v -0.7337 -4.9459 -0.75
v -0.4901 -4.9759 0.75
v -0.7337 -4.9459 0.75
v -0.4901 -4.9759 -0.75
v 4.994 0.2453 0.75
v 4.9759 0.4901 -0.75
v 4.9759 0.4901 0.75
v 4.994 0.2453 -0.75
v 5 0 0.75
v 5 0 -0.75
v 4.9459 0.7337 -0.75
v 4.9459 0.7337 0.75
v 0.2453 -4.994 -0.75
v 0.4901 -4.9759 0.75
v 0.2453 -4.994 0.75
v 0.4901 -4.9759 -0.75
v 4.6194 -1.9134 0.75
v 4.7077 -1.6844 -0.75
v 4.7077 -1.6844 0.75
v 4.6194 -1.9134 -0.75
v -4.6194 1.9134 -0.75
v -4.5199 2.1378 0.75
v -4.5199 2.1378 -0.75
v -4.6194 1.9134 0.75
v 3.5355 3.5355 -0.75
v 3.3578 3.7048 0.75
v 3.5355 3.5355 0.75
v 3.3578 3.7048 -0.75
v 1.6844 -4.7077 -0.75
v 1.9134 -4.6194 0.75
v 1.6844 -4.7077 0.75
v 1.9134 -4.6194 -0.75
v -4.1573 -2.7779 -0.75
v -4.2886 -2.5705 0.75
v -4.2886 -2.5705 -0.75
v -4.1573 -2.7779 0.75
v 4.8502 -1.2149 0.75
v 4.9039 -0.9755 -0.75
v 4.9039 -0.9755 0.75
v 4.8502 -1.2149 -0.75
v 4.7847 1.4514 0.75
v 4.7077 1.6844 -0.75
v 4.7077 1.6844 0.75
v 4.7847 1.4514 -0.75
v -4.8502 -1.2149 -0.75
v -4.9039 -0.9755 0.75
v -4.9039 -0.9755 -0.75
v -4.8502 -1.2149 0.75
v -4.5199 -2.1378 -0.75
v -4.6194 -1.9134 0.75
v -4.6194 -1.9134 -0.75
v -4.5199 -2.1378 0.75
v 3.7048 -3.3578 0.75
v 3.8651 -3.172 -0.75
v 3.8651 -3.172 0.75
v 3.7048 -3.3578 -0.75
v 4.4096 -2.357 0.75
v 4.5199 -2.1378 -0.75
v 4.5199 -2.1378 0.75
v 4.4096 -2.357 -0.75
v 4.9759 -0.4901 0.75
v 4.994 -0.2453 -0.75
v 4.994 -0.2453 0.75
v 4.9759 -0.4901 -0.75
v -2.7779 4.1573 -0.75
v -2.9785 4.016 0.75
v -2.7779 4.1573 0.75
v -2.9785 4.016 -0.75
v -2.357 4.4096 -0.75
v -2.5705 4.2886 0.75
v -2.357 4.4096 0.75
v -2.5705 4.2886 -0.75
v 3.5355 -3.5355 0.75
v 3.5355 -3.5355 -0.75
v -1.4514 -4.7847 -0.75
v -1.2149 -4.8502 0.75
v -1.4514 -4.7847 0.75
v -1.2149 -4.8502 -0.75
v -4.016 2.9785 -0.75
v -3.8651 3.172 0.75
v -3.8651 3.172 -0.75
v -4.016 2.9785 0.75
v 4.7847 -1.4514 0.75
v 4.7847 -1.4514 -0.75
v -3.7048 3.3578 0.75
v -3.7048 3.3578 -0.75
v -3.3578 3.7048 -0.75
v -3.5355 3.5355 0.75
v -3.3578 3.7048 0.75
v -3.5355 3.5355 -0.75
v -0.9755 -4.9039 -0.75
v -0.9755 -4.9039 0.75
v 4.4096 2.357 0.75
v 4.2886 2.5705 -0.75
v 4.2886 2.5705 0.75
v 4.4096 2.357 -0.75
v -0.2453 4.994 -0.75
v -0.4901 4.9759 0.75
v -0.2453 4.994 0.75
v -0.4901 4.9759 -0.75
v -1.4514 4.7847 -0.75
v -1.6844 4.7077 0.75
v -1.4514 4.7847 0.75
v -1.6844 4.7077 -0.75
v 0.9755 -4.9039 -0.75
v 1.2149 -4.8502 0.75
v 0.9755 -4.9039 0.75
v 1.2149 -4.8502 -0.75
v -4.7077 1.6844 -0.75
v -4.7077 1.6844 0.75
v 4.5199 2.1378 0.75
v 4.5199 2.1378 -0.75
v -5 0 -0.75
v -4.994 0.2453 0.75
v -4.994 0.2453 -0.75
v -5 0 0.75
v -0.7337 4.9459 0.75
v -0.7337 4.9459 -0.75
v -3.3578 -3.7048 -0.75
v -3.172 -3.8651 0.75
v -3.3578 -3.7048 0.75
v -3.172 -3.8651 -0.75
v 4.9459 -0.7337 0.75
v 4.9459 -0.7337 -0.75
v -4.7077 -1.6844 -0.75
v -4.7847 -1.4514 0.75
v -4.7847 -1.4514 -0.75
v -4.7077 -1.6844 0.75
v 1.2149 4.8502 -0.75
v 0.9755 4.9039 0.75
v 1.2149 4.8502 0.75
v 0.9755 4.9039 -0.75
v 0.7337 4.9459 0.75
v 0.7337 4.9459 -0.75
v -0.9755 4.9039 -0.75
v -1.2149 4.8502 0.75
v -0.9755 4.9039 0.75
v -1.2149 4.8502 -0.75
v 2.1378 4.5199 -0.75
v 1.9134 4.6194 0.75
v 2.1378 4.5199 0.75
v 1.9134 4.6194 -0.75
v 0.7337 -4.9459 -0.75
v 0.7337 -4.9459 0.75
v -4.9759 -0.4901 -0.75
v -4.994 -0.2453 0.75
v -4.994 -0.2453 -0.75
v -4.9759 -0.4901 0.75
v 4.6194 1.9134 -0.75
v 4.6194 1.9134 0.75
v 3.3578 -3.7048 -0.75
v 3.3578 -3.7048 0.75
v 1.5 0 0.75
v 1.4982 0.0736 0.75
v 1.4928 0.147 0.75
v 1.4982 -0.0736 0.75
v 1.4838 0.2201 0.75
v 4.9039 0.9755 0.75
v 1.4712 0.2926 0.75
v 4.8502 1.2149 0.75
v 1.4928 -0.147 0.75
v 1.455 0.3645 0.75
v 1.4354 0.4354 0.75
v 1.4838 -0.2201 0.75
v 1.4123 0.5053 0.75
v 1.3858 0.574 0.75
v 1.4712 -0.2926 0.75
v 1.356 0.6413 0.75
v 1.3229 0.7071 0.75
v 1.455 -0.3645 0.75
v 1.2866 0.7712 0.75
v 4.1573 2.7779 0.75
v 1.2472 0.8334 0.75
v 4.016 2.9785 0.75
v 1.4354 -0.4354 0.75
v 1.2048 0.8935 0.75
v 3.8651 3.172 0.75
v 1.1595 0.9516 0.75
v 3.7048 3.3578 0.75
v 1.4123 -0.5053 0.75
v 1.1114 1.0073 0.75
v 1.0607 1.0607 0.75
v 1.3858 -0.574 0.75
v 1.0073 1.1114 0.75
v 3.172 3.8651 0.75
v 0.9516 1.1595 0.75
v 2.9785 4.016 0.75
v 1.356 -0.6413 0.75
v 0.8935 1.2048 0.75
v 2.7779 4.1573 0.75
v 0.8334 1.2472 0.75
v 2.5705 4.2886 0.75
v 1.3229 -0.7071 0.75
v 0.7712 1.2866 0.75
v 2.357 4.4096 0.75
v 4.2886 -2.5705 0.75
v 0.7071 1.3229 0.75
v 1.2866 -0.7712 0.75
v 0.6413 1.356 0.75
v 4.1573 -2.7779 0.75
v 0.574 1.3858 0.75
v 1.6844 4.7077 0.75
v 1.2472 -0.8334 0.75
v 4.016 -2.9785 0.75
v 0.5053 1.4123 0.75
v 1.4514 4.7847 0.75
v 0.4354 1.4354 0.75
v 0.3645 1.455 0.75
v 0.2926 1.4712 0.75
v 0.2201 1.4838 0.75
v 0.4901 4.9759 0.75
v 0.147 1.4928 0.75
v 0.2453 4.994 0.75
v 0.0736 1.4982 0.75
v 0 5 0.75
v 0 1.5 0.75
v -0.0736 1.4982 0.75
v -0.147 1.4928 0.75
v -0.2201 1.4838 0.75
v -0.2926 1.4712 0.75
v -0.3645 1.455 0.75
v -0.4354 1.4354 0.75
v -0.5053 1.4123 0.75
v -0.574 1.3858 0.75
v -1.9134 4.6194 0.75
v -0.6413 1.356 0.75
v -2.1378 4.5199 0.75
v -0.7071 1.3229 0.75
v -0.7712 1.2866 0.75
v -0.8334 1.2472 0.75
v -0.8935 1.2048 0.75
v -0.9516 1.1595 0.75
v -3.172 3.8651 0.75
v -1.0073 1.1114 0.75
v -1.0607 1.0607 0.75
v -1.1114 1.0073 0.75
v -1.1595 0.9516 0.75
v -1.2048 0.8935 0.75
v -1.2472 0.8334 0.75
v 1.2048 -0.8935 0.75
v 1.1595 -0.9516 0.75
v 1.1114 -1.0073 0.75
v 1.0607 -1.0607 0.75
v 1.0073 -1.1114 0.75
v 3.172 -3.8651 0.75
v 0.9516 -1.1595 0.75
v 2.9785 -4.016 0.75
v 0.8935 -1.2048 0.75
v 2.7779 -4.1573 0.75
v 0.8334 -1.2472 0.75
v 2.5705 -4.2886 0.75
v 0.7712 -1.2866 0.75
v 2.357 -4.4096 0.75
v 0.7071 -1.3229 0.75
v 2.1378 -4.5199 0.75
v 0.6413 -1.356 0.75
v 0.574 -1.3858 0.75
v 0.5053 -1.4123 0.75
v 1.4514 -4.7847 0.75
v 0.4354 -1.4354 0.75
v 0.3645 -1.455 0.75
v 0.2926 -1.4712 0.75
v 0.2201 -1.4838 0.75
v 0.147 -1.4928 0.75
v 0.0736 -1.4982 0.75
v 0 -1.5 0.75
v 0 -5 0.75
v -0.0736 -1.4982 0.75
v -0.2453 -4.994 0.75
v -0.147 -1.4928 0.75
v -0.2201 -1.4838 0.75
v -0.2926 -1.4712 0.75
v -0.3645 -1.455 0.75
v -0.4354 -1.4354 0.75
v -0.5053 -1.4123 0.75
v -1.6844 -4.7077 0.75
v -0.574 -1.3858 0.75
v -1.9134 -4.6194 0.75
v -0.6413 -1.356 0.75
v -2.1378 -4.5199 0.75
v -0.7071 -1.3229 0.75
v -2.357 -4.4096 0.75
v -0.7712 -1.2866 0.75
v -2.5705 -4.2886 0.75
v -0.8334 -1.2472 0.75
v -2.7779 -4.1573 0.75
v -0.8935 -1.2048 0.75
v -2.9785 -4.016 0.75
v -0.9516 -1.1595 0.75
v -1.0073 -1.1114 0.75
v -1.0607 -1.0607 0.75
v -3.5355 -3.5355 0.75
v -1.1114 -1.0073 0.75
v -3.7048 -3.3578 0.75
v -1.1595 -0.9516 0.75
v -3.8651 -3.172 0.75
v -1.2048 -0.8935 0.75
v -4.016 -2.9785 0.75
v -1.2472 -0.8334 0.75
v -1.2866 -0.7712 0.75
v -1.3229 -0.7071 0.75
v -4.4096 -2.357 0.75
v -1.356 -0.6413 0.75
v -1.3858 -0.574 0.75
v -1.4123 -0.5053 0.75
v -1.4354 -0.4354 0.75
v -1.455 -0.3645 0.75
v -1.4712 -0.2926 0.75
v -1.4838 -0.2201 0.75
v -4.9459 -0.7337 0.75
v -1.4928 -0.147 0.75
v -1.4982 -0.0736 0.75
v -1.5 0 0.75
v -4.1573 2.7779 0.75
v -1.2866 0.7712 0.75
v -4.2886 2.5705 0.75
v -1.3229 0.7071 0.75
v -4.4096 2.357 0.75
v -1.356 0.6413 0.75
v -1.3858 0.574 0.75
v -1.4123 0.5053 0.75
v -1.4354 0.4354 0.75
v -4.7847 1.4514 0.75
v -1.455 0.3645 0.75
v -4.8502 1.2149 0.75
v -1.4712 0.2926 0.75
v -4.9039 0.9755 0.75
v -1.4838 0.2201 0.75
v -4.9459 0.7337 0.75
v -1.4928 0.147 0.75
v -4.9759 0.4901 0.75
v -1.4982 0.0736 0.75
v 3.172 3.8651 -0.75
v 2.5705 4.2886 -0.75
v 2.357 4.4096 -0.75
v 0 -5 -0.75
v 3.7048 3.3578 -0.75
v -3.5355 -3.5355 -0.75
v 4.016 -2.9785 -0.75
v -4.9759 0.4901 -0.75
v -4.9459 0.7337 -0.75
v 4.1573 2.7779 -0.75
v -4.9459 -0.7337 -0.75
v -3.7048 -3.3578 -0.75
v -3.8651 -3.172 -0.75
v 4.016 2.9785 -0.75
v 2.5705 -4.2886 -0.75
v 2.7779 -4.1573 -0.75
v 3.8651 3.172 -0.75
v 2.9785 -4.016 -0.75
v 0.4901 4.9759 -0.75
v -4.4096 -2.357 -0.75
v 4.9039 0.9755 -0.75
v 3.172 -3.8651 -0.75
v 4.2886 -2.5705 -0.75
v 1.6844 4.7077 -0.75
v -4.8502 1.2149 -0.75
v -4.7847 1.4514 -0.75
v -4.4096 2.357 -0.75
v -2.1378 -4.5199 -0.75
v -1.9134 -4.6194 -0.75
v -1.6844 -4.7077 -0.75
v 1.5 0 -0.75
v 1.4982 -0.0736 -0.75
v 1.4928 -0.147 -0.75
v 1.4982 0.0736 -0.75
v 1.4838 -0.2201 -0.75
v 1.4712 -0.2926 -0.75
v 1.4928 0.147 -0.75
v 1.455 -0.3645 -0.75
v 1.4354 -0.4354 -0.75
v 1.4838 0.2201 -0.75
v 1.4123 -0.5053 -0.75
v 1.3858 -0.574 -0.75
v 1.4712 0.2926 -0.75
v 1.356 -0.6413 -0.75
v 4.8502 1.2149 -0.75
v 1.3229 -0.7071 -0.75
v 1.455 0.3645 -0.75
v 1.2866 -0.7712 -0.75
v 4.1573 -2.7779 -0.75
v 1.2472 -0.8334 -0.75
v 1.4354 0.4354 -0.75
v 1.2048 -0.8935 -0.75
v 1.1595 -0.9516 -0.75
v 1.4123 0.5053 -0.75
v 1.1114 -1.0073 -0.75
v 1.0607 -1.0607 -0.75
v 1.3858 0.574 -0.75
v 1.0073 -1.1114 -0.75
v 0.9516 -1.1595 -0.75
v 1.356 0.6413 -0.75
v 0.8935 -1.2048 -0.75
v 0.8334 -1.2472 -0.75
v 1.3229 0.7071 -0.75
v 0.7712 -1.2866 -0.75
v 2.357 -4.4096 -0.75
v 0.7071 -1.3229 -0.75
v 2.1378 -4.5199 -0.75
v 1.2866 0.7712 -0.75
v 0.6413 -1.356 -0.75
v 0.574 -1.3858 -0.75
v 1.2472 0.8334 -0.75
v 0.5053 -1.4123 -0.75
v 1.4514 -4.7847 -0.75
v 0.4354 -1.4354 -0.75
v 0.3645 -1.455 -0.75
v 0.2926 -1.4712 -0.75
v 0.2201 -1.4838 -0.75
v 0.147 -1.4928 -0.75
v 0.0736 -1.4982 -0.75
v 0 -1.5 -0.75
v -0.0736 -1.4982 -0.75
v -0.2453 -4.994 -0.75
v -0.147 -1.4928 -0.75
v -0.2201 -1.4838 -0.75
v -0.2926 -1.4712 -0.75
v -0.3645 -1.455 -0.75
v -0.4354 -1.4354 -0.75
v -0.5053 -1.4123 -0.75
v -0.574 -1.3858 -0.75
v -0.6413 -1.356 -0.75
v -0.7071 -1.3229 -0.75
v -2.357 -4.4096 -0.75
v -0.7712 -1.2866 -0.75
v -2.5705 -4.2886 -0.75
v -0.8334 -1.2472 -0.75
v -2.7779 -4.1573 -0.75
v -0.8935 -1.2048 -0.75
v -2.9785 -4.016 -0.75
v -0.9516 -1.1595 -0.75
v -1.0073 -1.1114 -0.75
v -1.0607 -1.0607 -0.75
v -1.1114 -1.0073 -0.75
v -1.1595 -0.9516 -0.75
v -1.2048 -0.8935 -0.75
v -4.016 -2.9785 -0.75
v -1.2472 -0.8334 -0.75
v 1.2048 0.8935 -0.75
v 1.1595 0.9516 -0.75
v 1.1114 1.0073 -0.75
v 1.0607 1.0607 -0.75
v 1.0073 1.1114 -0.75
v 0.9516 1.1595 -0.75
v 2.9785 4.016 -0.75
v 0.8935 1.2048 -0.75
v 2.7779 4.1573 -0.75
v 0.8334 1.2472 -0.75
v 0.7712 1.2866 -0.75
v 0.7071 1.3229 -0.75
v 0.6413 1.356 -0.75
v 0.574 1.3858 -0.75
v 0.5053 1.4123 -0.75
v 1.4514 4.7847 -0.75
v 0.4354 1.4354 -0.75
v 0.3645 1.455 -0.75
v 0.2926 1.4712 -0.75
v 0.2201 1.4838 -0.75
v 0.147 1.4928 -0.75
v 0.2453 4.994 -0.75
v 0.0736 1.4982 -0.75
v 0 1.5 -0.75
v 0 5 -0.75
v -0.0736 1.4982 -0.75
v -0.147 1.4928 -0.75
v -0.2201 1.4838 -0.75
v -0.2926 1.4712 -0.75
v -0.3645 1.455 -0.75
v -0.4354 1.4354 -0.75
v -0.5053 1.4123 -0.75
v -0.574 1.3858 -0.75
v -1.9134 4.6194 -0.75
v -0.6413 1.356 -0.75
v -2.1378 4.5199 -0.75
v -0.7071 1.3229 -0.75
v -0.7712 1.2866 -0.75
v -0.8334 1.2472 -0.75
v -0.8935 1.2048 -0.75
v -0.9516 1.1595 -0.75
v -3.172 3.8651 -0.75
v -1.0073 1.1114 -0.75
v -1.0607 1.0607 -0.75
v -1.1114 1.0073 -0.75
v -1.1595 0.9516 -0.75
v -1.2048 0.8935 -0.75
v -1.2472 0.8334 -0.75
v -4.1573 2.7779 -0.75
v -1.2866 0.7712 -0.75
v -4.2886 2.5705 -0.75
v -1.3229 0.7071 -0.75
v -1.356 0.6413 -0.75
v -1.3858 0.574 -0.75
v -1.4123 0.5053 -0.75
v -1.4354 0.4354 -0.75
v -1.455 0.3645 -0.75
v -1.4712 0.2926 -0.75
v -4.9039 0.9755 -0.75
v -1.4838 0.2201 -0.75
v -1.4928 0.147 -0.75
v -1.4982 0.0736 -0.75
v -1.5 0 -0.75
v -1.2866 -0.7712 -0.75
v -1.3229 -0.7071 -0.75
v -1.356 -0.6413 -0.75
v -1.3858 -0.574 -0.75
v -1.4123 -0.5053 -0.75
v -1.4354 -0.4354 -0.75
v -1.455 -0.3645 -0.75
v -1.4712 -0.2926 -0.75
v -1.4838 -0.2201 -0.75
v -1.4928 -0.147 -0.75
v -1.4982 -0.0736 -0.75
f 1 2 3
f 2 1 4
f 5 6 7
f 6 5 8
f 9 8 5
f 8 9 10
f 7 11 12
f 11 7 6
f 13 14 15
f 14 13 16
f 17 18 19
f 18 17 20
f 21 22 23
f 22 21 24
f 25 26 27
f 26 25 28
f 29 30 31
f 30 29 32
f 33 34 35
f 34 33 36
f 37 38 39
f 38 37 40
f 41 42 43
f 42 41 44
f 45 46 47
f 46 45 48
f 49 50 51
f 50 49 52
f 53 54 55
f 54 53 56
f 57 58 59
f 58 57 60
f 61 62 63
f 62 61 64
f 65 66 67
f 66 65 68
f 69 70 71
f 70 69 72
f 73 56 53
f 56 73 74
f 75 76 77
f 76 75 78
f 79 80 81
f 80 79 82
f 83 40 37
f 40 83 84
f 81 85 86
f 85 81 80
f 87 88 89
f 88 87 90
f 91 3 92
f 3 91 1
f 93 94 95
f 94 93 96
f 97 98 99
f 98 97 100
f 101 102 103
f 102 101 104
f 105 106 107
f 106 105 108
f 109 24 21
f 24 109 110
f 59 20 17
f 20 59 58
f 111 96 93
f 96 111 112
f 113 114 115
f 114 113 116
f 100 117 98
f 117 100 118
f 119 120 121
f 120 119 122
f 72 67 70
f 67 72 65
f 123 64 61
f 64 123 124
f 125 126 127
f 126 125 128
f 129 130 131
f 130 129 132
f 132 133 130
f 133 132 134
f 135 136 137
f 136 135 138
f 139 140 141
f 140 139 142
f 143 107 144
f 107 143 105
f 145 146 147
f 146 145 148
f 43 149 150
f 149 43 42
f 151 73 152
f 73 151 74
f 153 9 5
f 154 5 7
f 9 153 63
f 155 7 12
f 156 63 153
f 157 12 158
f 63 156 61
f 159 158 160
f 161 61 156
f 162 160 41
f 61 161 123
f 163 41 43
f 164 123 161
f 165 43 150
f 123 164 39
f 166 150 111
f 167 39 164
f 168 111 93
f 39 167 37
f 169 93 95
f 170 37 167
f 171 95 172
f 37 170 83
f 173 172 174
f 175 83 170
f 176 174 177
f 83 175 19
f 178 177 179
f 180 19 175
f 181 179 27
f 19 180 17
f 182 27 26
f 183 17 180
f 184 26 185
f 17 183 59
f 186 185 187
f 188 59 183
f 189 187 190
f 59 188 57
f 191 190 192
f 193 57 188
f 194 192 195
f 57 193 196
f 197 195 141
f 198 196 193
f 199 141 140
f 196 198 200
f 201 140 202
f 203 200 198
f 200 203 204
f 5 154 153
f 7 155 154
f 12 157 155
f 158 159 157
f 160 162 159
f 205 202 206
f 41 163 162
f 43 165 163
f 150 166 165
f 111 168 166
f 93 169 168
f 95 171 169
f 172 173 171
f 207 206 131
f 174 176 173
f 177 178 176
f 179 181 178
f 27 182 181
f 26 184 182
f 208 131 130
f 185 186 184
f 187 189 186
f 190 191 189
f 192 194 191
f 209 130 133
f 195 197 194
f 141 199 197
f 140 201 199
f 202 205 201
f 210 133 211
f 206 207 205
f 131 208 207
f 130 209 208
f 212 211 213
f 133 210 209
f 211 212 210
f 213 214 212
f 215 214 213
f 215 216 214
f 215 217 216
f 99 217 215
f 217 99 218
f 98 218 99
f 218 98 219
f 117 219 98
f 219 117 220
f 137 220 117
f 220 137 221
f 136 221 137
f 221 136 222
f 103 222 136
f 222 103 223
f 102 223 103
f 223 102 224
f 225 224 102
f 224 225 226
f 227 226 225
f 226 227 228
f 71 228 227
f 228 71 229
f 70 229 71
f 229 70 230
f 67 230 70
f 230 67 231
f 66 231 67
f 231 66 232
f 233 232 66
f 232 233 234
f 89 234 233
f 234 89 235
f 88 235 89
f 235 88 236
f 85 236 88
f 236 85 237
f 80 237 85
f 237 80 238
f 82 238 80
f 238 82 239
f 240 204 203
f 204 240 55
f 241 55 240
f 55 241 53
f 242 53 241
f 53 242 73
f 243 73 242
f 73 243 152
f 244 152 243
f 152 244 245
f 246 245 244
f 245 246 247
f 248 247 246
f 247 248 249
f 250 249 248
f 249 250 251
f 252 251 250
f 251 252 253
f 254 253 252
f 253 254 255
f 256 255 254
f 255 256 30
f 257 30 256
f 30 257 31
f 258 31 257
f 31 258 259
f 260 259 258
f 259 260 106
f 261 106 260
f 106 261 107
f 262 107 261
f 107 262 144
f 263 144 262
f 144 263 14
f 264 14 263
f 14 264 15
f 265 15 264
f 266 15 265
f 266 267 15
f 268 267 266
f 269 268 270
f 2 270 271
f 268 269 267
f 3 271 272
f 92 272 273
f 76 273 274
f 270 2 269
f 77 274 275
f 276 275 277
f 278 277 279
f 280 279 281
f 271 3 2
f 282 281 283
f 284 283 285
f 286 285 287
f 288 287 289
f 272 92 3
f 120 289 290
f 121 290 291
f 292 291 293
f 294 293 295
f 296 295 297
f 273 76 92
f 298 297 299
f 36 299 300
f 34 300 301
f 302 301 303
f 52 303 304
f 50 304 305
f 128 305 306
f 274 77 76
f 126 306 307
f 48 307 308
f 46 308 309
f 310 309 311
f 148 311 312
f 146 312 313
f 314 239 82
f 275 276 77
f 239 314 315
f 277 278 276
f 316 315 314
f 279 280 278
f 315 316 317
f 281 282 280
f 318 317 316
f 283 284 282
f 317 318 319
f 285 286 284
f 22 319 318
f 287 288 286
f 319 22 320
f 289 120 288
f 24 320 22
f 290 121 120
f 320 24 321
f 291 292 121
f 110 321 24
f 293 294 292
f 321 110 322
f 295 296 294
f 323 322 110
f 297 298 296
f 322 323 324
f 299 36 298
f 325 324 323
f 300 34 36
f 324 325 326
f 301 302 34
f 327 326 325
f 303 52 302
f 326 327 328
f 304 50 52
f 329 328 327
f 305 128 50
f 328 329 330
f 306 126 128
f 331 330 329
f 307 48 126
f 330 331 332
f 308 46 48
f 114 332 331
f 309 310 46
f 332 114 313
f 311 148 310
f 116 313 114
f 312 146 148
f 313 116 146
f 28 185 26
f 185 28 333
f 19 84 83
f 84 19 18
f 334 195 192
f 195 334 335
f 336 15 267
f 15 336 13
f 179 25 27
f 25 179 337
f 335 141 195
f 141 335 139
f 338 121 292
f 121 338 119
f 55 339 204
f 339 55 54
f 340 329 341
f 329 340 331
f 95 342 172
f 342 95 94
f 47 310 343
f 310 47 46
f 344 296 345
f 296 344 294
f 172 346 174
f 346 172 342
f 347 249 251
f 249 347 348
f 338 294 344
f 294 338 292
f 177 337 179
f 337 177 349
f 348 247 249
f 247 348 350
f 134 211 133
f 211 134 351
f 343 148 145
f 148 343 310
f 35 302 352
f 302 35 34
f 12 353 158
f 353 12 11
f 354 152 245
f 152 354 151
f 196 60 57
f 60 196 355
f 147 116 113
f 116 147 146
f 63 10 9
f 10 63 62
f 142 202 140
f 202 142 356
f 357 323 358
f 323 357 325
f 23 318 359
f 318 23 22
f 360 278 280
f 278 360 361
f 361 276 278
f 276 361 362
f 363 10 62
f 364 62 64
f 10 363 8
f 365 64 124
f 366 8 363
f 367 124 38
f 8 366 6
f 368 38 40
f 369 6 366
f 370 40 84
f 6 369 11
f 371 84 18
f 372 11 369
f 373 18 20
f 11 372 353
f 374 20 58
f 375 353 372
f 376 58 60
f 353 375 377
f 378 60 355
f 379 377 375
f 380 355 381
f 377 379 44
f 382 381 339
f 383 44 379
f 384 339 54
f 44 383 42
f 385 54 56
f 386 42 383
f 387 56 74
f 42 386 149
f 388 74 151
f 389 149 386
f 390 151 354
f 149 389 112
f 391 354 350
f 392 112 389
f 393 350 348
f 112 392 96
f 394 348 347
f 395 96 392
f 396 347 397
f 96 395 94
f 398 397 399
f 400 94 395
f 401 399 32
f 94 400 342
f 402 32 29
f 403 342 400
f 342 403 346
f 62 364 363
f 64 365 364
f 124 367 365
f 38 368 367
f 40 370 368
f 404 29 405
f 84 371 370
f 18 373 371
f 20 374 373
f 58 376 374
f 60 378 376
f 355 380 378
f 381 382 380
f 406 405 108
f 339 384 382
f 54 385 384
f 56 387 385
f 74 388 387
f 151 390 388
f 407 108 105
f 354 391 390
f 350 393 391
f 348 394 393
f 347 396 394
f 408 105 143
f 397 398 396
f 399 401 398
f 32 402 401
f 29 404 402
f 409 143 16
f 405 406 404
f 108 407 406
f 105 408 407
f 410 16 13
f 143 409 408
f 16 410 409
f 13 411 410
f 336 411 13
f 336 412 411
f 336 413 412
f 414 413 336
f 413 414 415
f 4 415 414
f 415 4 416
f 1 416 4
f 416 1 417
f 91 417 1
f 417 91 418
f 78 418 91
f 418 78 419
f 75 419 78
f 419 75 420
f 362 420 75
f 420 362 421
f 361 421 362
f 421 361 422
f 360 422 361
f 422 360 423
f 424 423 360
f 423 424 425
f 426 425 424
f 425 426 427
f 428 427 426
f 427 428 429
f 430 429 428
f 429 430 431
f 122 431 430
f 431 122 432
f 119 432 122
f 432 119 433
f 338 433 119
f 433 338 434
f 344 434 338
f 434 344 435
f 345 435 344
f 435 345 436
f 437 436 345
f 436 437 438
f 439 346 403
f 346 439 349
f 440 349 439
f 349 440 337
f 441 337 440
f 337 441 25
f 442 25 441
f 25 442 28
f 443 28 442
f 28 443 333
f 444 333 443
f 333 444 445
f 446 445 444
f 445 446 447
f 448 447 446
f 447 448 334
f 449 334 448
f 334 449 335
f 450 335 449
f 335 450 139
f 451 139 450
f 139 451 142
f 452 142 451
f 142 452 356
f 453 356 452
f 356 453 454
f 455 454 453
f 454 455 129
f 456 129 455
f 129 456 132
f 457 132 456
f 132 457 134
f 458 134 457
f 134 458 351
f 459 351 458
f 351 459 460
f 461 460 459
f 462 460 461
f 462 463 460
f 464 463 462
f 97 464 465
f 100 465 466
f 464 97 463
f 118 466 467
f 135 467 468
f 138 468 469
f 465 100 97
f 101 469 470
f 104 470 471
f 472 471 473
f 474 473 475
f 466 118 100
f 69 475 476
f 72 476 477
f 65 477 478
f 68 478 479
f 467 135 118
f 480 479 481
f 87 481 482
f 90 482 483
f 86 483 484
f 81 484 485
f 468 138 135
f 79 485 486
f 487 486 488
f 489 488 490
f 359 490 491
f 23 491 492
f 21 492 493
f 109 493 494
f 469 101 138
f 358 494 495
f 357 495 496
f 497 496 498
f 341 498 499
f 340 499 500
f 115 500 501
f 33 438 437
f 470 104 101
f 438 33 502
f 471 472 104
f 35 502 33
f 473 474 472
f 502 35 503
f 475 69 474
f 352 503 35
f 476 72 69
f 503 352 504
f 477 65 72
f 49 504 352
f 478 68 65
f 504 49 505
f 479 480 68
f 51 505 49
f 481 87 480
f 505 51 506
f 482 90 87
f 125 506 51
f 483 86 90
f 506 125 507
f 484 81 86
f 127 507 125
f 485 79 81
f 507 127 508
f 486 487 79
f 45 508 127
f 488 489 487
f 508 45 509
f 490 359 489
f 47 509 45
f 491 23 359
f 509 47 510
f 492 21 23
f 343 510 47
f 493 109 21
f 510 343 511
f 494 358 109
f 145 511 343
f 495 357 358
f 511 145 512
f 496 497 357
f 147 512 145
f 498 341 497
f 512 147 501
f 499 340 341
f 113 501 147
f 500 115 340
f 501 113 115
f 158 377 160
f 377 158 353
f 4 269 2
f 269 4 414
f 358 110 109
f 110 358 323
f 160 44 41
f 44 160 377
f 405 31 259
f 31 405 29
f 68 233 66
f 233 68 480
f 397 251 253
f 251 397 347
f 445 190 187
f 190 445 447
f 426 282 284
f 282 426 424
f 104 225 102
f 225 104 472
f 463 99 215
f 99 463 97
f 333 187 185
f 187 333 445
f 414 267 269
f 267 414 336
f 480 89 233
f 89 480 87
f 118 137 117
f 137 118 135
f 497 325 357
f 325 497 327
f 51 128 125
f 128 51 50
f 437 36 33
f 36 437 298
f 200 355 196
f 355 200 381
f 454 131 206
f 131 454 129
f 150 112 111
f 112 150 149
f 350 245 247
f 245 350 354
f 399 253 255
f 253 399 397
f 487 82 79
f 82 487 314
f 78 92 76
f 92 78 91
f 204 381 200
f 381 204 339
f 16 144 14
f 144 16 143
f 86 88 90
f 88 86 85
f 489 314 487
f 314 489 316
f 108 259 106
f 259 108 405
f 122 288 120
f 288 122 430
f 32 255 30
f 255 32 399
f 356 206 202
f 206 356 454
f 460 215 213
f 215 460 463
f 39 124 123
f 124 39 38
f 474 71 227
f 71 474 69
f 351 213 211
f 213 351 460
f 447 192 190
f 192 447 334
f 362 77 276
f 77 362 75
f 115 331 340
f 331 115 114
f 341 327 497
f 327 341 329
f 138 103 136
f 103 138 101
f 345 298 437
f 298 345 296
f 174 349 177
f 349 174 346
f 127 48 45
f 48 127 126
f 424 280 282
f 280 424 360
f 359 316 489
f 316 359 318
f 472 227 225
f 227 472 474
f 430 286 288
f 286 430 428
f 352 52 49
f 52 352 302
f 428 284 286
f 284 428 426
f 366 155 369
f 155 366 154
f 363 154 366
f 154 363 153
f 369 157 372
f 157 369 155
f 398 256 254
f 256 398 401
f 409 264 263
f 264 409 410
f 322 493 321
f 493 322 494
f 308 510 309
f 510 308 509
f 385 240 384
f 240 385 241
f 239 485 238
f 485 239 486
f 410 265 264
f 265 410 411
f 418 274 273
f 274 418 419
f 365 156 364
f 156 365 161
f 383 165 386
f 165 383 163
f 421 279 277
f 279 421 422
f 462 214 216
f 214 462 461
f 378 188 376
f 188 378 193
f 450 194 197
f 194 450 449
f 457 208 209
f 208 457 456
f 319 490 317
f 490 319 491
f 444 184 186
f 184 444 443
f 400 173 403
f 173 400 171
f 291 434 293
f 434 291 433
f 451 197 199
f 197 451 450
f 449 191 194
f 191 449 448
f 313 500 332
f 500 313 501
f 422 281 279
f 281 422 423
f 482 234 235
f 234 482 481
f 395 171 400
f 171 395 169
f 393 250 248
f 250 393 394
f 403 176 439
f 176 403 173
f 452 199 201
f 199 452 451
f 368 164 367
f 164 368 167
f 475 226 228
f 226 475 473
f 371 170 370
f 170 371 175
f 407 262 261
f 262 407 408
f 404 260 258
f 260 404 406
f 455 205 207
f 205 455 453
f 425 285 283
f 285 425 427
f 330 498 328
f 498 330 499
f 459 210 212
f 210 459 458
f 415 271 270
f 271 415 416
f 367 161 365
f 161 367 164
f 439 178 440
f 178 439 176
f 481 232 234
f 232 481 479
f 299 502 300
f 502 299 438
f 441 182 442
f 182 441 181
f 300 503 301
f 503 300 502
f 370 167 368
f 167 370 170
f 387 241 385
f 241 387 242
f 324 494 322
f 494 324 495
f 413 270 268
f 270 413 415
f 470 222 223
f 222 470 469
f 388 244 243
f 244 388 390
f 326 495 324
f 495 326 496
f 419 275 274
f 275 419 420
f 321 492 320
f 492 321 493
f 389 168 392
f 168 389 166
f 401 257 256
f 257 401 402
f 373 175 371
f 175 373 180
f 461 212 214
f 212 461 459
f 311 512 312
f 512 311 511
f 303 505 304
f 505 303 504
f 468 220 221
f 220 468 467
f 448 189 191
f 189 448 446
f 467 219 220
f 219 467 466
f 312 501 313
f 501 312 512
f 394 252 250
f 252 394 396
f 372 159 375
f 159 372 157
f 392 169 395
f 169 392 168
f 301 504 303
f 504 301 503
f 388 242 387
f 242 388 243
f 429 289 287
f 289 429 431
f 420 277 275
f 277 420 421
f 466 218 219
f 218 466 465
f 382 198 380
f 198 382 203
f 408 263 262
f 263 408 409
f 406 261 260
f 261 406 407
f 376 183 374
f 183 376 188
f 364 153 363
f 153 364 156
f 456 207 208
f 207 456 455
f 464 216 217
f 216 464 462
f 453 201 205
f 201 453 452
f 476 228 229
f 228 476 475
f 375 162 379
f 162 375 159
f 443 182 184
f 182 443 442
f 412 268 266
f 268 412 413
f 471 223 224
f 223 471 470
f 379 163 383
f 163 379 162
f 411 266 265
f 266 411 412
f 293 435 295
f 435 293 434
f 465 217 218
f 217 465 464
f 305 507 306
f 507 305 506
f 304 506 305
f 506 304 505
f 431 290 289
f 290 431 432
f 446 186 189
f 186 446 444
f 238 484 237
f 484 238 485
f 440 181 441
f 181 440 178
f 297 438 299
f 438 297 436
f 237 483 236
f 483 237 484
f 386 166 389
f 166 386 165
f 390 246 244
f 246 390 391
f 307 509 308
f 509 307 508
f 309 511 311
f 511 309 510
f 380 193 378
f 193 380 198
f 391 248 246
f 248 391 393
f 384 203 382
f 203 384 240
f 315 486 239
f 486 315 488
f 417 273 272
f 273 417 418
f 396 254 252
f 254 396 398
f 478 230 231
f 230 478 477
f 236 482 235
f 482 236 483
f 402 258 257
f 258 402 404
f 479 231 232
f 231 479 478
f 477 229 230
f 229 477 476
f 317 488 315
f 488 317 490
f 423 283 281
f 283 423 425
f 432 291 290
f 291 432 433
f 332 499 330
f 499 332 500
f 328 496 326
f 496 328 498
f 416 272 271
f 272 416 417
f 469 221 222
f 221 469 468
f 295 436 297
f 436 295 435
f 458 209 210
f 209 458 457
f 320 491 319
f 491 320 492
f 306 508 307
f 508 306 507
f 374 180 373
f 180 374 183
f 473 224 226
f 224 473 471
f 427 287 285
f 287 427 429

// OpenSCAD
$fn = 128;

inner_d = 3.0;
outer_d = 10.0;
thickness = 1.5;
eps = 0.02;

difference() {
    cylinder(h = thickness, d = outer_d, center = true);
    cylinder(h = thickness + 2*eps, d = inner_d, center = true);
}
